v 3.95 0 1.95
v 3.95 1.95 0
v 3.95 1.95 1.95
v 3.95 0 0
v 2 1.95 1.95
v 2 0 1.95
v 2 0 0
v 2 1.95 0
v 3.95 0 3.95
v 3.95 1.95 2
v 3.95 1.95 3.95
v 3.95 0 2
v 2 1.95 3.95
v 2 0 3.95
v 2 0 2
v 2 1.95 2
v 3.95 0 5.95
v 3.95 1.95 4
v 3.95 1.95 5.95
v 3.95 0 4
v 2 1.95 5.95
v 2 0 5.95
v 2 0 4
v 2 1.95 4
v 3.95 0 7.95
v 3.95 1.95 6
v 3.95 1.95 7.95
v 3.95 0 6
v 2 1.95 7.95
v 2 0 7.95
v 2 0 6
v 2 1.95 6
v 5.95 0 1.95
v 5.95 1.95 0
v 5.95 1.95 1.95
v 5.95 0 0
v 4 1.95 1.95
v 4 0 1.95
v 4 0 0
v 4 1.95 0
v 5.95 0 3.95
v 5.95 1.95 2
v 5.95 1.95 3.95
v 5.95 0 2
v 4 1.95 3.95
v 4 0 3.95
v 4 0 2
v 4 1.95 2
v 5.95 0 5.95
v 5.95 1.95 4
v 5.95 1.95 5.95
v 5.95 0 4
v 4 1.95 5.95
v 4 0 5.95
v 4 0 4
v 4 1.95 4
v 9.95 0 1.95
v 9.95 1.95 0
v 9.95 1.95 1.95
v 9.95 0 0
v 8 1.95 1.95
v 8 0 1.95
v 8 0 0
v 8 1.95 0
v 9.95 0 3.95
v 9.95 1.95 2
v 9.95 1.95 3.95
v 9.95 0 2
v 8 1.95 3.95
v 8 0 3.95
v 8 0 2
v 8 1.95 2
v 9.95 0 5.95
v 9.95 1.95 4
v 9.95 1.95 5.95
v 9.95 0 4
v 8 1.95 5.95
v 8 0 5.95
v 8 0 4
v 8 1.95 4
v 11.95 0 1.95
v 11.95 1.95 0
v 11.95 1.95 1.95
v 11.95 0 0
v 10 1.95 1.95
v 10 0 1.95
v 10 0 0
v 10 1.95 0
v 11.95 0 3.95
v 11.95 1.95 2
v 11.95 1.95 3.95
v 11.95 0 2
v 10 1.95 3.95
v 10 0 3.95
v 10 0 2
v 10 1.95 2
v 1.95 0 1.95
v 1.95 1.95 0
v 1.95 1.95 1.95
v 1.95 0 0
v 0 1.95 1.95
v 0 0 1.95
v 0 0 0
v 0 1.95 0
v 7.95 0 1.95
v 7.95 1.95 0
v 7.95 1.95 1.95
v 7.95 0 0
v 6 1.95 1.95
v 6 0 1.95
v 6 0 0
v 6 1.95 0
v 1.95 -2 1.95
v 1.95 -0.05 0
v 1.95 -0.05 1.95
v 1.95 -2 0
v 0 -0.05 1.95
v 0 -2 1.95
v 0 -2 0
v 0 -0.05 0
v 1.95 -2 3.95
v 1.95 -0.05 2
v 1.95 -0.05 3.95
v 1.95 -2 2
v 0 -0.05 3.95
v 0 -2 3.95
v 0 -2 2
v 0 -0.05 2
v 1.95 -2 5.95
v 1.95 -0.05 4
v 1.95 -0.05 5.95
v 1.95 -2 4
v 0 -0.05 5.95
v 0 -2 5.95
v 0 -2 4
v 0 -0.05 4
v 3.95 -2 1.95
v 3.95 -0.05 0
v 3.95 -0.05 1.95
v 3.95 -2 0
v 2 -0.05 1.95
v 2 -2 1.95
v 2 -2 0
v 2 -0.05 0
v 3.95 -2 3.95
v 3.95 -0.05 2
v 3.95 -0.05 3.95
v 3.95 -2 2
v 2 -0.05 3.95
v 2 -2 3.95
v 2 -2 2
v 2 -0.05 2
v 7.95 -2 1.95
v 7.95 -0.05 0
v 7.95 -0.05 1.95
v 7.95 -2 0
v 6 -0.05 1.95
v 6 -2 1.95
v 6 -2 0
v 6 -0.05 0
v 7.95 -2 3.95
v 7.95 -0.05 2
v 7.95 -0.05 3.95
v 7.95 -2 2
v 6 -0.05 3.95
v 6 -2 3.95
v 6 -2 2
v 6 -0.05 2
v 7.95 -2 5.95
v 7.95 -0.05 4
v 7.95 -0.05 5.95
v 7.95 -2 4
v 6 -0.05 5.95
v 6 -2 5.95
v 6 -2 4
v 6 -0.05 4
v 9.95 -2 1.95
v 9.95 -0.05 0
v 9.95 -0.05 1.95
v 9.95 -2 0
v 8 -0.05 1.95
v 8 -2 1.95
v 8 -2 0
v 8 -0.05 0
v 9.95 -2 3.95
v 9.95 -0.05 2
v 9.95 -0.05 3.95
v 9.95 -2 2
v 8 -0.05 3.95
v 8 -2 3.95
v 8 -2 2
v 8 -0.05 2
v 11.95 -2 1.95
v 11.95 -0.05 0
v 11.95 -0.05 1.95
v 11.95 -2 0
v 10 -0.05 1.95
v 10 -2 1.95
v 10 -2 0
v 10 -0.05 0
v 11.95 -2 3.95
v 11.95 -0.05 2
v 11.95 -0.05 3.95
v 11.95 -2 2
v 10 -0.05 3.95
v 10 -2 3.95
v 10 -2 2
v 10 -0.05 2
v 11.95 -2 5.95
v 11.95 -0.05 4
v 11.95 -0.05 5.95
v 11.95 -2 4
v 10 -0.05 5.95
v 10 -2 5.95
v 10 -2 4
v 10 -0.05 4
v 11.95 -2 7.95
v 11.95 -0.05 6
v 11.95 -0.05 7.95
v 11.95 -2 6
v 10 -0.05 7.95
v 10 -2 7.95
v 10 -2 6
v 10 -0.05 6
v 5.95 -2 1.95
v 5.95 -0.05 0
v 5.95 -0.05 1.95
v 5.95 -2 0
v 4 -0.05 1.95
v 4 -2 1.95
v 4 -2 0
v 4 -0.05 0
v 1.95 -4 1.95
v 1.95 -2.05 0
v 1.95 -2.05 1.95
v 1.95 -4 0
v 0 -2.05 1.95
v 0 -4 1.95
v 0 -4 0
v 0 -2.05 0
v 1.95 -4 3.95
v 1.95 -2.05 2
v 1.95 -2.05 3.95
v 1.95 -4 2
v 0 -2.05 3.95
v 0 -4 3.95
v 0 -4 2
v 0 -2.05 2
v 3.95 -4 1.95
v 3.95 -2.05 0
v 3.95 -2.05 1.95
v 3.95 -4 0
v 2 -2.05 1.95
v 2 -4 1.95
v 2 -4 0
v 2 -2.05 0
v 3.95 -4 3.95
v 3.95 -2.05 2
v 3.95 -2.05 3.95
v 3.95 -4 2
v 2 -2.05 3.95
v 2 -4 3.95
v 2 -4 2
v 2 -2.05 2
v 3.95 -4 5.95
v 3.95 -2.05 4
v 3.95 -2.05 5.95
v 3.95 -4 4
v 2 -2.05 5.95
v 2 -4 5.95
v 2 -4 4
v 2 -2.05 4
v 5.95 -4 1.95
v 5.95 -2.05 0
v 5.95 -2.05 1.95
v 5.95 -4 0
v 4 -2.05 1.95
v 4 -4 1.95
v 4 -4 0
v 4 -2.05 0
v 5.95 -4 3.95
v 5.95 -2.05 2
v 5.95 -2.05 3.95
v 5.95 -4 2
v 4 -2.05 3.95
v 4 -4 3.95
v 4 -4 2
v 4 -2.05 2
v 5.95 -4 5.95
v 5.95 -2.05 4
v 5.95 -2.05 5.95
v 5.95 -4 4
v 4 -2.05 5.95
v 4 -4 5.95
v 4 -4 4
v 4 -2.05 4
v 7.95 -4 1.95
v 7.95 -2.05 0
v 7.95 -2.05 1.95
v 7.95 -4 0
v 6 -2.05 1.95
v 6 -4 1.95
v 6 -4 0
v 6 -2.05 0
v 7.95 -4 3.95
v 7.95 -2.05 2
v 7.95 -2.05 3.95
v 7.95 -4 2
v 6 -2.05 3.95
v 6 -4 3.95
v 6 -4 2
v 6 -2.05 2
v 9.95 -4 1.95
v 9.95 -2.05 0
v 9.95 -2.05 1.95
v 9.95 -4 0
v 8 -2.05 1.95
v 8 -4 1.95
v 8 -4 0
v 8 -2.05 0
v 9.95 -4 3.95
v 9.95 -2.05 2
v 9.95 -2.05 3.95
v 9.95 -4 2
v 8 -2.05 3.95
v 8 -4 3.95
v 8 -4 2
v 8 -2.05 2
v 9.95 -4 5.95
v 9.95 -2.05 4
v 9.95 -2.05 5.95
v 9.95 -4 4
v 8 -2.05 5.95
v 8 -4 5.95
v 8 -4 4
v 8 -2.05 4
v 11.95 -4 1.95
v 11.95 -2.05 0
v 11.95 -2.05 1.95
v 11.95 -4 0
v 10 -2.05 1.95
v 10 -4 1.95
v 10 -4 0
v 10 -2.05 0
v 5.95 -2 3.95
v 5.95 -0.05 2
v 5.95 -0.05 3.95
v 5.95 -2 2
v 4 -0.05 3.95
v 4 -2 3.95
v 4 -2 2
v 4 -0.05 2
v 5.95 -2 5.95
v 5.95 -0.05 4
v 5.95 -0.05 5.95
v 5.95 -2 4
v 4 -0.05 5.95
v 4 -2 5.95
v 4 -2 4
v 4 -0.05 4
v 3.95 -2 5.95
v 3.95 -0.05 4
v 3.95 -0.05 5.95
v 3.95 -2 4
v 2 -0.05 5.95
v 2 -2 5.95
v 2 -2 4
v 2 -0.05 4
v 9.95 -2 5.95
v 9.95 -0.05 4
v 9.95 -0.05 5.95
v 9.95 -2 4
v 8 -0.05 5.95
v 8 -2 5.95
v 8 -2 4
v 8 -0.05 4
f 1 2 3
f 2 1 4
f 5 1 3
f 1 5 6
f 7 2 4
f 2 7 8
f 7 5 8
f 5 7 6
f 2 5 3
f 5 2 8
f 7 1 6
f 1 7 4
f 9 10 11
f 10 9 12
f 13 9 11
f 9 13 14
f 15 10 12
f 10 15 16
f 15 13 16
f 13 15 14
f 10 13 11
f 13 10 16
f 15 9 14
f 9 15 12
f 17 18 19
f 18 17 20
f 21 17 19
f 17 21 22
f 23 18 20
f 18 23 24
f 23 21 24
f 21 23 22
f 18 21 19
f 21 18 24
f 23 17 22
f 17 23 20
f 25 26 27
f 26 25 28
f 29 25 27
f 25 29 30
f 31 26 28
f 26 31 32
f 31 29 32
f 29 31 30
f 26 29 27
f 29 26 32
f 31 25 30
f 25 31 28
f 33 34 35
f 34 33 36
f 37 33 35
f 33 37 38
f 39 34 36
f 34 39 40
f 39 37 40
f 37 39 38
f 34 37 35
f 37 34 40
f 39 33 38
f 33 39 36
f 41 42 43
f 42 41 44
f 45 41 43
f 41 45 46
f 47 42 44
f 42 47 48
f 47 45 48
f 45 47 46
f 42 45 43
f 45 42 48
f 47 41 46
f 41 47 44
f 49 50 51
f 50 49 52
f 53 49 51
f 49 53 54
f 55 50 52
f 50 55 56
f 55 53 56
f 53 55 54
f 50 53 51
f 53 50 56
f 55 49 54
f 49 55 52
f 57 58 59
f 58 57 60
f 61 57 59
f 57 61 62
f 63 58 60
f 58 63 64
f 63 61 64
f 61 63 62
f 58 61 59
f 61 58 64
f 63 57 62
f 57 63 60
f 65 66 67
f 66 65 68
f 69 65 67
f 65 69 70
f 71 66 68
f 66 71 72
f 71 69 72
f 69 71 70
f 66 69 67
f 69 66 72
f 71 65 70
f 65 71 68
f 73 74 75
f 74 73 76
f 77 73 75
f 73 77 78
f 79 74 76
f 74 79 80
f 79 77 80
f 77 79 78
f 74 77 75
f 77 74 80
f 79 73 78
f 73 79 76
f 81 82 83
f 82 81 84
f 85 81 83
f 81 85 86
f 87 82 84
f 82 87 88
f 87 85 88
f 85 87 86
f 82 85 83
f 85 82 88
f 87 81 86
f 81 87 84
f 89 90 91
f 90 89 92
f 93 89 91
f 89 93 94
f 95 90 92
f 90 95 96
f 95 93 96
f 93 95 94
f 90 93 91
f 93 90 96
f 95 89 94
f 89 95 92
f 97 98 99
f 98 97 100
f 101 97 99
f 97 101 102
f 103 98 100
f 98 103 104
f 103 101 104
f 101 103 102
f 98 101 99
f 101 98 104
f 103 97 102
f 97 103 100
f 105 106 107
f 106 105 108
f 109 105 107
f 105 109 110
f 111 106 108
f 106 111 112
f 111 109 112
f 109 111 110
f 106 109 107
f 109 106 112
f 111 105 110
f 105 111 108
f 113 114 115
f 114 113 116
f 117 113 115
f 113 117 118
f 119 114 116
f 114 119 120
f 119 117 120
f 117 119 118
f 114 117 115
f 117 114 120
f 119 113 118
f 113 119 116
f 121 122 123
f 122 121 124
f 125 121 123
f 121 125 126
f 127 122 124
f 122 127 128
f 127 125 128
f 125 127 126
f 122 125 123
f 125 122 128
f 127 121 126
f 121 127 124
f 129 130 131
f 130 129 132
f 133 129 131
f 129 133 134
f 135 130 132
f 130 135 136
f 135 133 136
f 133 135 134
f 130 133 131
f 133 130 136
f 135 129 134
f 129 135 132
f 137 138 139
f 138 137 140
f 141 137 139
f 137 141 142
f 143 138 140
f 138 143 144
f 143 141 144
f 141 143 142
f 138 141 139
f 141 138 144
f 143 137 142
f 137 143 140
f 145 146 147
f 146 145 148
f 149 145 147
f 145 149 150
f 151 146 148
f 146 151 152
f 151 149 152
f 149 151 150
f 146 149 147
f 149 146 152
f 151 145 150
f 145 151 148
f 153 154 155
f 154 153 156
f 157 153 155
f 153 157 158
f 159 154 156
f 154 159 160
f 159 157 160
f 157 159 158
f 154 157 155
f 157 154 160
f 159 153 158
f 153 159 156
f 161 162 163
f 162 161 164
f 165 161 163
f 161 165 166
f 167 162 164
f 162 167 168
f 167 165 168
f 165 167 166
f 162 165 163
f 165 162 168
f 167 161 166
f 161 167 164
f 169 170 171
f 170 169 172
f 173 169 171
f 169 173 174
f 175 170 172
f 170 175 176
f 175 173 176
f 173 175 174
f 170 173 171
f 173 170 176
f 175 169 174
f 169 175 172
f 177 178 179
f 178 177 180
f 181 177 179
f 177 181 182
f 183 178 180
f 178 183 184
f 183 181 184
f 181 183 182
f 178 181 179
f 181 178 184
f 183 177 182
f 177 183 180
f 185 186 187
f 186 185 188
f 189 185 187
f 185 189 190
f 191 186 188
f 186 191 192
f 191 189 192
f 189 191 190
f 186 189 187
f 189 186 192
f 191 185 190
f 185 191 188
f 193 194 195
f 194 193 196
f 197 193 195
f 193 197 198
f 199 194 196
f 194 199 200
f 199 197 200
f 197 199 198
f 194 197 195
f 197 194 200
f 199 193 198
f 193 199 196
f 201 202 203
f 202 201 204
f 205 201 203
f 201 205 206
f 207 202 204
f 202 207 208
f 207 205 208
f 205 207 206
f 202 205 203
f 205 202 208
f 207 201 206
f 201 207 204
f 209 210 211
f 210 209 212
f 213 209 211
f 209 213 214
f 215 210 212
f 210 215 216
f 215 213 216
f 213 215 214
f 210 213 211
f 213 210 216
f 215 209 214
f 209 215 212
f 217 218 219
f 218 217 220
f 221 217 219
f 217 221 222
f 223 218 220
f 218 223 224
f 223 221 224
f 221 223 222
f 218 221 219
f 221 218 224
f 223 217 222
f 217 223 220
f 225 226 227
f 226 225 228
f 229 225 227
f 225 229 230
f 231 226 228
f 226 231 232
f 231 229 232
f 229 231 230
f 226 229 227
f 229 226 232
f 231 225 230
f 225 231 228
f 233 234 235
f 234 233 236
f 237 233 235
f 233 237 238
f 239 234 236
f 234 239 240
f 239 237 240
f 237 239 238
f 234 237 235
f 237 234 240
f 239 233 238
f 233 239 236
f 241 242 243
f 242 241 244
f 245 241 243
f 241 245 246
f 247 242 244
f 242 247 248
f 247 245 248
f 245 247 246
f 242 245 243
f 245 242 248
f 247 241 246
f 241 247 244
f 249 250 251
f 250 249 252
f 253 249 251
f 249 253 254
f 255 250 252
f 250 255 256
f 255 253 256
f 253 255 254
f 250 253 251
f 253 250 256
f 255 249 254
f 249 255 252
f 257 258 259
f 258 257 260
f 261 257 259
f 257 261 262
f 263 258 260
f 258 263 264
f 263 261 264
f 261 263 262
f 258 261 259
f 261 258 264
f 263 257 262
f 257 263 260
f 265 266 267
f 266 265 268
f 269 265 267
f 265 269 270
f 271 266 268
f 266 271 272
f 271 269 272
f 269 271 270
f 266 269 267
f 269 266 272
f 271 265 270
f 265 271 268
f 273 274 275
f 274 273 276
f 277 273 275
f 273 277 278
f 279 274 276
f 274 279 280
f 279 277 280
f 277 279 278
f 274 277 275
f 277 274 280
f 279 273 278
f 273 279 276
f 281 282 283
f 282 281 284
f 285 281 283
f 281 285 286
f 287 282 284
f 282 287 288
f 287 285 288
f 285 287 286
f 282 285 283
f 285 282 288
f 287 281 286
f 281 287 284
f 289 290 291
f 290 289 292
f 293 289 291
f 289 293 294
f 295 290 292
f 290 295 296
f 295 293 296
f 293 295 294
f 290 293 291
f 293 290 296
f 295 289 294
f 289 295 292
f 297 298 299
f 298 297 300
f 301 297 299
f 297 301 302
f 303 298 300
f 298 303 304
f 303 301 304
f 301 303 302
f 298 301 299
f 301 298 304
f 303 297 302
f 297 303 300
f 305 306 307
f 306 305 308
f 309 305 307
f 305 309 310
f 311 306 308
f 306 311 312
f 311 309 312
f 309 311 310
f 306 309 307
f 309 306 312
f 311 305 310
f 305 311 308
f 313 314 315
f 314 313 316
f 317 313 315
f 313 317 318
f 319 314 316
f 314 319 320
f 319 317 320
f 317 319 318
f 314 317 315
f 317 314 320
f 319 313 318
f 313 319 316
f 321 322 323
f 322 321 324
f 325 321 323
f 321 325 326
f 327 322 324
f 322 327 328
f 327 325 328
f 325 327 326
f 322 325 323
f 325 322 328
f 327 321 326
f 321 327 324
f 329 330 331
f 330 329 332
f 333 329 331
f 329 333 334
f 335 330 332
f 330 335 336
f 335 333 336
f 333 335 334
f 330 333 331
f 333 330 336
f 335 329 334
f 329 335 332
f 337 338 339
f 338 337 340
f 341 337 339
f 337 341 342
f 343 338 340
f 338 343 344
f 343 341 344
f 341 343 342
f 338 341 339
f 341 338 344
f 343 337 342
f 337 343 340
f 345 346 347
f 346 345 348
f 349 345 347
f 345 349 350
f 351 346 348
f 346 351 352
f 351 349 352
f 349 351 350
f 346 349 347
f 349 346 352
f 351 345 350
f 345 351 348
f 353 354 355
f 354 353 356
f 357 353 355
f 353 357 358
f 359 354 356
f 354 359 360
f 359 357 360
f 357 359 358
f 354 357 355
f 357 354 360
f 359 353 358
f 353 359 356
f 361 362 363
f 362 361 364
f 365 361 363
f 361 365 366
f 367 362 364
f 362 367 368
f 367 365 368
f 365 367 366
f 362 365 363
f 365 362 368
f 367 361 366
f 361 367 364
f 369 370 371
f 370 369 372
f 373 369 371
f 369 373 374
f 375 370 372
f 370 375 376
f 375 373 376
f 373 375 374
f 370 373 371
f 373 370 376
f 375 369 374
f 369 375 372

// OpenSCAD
m = [[1, 4, 3, 1, 3, 2],
     [3, 2, 1, 3, 2, 4],
     [2, 3, 3, 2, 3, 1]];



w = [[0, 0, 0, 0, 0, 0],
     //[0, 2, 3, 1, 2, 0],
     [0, 1, 2, 0, 1, 0],
     [0, 0, 0, 0, 0, 0]];



module sugar(x,y,h)
{
  for (i = [0: h-1]) {
    translate([2*x, -2*y, 2*i])
    color([1,1,1])
    cube(1.95);
  };   
};

module water(x,y,h)
{
  if (h>0) {
    for (i = [0: h-1]) {
      translate([2*x, -2*y, 2*m[y][x] + 2*i])
      color([0.1,0.1,0.7,0.3])
      cube(1.95);
    };   
  };
};

for ( y = [0:3]) {
    for ( x = [0:6]) {
        sugar(x,y, m[y][x]);
    };
};
for ( y = [0:3]) {
    for ( x = [0:6]) {
        water(x,y, w[y][x]);
    };
};    
